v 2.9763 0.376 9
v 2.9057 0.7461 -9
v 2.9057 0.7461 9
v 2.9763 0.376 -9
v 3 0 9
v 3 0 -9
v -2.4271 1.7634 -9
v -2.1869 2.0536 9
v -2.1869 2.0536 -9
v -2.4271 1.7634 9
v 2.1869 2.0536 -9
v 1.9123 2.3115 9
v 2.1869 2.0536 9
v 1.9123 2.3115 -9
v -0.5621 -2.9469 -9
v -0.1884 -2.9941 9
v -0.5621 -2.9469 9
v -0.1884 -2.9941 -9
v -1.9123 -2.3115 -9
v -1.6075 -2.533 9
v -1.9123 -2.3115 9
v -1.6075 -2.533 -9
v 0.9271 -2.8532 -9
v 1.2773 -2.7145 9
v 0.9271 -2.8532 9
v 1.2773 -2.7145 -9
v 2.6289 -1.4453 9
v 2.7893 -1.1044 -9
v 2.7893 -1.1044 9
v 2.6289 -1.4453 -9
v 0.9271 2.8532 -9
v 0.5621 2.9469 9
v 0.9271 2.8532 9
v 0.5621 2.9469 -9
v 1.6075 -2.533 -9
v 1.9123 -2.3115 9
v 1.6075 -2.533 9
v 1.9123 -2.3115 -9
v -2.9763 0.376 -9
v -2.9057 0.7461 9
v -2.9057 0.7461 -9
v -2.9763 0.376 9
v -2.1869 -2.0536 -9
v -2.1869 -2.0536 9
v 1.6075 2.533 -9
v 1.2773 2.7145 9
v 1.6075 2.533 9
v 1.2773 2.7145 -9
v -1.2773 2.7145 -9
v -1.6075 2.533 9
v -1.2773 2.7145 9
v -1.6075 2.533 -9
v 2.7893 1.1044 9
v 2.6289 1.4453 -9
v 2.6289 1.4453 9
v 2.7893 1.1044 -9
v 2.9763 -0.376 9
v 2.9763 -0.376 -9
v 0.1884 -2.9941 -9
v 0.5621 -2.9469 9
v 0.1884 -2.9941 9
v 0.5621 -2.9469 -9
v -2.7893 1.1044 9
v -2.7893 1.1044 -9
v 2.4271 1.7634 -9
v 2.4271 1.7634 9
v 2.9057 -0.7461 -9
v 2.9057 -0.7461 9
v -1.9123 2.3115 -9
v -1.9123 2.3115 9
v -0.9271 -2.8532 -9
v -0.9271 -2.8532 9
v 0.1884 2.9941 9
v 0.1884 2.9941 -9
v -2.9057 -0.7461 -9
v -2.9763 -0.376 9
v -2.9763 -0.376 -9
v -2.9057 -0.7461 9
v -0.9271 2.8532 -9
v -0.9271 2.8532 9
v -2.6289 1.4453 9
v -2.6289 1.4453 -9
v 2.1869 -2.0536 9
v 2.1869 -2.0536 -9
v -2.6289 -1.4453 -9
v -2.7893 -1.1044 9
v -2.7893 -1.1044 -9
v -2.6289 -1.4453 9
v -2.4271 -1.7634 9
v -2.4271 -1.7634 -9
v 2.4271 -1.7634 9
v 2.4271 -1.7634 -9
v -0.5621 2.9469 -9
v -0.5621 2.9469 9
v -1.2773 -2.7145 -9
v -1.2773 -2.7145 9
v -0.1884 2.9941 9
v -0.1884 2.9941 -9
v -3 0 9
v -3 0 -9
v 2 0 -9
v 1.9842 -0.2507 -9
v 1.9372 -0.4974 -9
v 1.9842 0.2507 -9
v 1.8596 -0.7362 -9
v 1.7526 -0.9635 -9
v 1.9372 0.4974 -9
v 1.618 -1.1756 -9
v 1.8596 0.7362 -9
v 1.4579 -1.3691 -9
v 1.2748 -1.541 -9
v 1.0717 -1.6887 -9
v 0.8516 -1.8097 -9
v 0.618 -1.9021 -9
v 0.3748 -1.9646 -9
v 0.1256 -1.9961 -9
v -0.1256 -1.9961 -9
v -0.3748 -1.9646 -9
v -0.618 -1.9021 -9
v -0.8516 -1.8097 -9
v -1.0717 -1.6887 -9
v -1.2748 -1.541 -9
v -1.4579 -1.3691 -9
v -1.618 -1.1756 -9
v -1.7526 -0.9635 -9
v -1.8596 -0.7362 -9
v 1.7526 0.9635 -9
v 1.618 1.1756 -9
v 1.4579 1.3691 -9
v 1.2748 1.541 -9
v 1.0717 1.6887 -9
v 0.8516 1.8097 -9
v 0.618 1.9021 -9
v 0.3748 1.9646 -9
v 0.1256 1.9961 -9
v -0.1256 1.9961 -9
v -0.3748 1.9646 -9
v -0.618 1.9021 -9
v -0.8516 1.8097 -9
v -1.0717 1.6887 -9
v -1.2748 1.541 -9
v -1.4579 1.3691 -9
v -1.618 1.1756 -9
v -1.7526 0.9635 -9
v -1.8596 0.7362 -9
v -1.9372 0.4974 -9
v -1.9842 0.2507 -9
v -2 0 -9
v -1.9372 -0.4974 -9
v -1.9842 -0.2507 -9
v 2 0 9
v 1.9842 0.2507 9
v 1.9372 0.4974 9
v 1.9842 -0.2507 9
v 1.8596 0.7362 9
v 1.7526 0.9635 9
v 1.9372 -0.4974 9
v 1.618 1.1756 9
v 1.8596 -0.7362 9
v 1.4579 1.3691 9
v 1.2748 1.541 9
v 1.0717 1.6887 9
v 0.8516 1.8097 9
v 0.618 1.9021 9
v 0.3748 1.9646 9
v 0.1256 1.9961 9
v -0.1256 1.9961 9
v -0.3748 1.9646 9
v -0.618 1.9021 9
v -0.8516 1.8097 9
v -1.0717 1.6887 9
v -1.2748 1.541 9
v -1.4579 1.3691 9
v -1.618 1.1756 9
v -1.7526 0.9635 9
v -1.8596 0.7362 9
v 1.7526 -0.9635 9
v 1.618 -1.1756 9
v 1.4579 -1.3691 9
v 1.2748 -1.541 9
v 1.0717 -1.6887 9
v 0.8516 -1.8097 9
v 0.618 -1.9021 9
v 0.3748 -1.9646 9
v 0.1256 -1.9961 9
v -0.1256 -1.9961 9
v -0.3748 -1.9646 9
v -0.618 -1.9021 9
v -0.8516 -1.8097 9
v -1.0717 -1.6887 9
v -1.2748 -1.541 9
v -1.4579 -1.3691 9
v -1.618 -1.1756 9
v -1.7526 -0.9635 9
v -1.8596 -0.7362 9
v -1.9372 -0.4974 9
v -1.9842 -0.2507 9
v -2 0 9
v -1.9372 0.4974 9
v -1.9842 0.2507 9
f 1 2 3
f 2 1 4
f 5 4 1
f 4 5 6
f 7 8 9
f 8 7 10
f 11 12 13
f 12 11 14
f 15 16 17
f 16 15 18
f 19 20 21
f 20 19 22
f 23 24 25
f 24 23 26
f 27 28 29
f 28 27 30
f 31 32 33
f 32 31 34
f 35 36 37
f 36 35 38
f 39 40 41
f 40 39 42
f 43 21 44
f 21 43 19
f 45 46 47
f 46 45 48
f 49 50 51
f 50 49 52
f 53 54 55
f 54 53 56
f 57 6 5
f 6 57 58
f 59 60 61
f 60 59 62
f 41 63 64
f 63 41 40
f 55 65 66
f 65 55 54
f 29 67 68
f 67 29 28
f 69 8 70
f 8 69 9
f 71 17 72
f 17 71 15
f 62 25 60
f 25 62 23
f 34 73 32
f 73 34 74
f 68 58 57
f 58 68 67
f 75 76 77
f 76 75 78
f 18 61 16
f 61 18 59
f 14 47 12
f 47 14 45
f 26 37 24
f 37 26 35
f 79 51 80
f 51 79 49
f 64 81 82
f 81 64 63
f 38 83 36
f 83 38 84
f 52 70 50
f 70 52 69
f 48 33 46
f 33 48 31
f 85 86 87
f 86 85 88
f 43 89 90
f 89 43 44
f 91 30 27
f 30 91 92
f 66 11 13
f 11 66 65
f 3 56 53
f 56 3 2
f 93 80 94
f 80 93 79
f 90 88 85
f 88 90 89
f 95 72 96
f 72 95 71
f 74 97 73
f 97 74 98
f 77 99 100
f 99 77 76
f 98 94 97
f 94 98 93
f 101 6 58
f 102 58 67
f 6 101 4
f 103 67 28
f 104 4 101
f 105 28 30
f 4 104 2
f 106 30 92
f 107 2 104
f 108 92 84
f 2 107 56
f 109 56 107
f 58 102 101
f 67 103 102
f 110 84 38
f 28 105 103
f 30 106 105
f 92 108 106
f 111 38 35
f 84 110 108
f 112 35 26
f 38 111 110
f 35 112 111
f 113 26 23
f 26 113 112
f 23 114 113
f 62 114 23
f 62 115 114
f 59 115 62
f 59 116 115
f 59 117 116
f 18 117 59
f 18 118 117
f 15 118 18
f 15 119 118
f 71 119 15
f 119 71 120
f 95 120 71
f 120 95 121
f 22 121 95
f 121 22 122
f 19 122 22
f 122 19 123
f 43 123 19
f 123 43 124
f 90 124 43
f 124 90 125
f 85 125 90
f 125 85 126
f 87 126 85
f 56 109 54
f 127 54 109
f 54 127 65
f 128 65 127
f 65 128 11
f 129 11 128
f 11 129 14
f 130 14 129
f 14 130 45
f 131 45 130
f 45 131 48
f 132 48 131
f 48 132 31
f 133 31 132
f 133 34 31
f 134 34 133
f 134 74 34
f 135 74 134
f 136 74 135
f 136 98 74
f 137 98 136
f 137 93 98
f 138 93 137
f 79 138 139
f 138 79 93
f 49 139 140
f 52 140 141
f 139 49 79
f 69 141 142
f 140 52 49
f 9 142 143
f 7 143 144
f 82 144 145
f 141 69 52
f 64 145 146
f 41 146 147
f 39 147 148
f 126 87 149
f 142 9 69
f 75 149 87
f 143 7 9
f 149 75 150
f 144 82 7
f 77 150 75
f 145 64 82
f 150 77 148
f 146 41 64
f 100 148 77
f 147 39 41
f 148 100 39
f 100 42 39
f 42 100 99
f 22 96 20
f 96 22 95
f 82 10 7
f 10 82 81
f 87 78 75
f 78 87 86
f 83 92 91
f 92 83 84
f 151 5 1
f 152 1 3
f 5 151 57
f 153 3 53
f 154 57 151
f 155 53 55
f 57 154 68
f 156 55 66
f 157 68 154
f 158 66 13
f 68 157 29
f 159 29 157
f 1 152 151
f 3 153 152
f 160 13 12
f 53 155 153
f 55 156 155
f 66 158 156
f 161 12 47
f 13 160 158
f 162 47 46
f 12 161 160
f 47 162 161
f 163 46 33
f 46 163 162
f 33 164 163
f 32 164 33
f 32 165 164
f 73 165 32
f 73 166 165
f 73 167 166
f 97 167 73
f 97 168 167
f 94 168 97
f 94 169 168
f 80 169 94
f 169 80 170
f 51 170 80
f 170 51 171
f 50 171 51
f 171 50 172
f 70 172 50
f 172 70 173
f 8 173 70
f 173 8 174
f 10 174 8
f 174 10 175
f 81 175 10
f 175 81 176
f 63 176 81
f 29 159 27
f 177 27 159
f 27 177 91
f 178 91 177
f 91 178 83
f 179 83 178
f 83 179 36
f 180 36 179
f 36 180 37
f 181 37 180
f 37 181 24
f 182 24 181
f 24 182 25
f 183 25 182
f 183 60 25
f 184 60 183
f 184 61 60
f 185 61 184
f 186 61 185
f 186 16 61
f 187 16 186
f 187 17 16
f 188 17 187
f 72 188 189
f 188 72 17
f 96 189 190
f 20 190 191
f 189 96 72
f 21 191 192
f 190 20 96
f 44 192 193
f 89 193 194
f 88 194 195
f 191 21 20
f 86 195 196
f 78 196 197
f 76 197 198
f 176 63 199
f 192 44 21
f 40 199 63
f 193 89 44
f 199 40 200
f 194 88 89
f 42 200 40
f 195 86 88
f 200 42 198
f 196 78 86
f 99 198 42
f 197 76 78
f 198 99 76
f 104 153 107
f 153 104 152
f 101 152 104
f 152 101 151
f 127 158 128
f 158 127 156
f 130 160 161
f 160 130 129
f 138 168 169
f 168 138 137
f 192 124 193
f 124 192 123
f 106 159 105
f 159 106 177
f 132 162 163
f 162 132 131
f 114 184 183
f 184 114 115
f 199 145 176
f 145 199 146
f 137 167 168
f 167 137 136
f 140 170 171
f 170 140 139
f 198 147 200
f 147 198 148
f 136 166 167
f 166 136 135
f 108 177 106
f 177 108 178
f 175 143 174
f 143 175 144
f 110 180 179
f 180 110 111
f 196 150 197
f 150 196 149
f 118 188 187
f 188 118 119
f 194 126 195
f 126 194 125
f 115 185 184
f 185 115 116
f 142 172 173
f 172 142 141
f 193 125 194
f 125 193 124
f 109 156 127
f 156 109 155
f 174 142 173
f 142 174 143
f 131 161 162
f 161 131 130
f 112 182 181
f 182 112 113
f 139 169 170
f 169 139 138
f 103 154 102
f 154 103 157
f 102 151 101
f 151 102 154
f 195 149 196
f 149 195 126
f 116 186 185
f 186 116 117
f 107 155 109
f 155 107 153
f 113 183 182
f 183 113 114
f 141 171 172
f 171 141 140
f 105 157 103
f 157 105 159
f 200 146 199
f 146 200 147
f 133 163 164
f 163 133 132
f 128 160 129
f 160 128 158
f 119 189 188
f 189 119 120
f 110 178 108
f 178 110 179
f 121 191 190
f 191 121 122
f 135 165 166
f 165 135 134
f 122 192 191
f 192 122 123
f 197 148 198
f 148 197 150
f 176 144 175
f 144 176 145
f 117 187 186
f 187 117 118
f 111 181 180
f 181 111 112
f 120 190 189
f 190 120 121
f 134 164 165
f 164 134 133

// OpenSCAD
$fn = 50;


difference() {
	union() {
		translate(v = [0, 0, -9.0000000000]) {
			cylinder(h = 18, r = 3.0000000000);
		}
	}
	union() {
		translate(v = [0, 0, -100.0000000000]) {
			cylinder(h = 200, r = 2.0000000000);
		}
	}
}
